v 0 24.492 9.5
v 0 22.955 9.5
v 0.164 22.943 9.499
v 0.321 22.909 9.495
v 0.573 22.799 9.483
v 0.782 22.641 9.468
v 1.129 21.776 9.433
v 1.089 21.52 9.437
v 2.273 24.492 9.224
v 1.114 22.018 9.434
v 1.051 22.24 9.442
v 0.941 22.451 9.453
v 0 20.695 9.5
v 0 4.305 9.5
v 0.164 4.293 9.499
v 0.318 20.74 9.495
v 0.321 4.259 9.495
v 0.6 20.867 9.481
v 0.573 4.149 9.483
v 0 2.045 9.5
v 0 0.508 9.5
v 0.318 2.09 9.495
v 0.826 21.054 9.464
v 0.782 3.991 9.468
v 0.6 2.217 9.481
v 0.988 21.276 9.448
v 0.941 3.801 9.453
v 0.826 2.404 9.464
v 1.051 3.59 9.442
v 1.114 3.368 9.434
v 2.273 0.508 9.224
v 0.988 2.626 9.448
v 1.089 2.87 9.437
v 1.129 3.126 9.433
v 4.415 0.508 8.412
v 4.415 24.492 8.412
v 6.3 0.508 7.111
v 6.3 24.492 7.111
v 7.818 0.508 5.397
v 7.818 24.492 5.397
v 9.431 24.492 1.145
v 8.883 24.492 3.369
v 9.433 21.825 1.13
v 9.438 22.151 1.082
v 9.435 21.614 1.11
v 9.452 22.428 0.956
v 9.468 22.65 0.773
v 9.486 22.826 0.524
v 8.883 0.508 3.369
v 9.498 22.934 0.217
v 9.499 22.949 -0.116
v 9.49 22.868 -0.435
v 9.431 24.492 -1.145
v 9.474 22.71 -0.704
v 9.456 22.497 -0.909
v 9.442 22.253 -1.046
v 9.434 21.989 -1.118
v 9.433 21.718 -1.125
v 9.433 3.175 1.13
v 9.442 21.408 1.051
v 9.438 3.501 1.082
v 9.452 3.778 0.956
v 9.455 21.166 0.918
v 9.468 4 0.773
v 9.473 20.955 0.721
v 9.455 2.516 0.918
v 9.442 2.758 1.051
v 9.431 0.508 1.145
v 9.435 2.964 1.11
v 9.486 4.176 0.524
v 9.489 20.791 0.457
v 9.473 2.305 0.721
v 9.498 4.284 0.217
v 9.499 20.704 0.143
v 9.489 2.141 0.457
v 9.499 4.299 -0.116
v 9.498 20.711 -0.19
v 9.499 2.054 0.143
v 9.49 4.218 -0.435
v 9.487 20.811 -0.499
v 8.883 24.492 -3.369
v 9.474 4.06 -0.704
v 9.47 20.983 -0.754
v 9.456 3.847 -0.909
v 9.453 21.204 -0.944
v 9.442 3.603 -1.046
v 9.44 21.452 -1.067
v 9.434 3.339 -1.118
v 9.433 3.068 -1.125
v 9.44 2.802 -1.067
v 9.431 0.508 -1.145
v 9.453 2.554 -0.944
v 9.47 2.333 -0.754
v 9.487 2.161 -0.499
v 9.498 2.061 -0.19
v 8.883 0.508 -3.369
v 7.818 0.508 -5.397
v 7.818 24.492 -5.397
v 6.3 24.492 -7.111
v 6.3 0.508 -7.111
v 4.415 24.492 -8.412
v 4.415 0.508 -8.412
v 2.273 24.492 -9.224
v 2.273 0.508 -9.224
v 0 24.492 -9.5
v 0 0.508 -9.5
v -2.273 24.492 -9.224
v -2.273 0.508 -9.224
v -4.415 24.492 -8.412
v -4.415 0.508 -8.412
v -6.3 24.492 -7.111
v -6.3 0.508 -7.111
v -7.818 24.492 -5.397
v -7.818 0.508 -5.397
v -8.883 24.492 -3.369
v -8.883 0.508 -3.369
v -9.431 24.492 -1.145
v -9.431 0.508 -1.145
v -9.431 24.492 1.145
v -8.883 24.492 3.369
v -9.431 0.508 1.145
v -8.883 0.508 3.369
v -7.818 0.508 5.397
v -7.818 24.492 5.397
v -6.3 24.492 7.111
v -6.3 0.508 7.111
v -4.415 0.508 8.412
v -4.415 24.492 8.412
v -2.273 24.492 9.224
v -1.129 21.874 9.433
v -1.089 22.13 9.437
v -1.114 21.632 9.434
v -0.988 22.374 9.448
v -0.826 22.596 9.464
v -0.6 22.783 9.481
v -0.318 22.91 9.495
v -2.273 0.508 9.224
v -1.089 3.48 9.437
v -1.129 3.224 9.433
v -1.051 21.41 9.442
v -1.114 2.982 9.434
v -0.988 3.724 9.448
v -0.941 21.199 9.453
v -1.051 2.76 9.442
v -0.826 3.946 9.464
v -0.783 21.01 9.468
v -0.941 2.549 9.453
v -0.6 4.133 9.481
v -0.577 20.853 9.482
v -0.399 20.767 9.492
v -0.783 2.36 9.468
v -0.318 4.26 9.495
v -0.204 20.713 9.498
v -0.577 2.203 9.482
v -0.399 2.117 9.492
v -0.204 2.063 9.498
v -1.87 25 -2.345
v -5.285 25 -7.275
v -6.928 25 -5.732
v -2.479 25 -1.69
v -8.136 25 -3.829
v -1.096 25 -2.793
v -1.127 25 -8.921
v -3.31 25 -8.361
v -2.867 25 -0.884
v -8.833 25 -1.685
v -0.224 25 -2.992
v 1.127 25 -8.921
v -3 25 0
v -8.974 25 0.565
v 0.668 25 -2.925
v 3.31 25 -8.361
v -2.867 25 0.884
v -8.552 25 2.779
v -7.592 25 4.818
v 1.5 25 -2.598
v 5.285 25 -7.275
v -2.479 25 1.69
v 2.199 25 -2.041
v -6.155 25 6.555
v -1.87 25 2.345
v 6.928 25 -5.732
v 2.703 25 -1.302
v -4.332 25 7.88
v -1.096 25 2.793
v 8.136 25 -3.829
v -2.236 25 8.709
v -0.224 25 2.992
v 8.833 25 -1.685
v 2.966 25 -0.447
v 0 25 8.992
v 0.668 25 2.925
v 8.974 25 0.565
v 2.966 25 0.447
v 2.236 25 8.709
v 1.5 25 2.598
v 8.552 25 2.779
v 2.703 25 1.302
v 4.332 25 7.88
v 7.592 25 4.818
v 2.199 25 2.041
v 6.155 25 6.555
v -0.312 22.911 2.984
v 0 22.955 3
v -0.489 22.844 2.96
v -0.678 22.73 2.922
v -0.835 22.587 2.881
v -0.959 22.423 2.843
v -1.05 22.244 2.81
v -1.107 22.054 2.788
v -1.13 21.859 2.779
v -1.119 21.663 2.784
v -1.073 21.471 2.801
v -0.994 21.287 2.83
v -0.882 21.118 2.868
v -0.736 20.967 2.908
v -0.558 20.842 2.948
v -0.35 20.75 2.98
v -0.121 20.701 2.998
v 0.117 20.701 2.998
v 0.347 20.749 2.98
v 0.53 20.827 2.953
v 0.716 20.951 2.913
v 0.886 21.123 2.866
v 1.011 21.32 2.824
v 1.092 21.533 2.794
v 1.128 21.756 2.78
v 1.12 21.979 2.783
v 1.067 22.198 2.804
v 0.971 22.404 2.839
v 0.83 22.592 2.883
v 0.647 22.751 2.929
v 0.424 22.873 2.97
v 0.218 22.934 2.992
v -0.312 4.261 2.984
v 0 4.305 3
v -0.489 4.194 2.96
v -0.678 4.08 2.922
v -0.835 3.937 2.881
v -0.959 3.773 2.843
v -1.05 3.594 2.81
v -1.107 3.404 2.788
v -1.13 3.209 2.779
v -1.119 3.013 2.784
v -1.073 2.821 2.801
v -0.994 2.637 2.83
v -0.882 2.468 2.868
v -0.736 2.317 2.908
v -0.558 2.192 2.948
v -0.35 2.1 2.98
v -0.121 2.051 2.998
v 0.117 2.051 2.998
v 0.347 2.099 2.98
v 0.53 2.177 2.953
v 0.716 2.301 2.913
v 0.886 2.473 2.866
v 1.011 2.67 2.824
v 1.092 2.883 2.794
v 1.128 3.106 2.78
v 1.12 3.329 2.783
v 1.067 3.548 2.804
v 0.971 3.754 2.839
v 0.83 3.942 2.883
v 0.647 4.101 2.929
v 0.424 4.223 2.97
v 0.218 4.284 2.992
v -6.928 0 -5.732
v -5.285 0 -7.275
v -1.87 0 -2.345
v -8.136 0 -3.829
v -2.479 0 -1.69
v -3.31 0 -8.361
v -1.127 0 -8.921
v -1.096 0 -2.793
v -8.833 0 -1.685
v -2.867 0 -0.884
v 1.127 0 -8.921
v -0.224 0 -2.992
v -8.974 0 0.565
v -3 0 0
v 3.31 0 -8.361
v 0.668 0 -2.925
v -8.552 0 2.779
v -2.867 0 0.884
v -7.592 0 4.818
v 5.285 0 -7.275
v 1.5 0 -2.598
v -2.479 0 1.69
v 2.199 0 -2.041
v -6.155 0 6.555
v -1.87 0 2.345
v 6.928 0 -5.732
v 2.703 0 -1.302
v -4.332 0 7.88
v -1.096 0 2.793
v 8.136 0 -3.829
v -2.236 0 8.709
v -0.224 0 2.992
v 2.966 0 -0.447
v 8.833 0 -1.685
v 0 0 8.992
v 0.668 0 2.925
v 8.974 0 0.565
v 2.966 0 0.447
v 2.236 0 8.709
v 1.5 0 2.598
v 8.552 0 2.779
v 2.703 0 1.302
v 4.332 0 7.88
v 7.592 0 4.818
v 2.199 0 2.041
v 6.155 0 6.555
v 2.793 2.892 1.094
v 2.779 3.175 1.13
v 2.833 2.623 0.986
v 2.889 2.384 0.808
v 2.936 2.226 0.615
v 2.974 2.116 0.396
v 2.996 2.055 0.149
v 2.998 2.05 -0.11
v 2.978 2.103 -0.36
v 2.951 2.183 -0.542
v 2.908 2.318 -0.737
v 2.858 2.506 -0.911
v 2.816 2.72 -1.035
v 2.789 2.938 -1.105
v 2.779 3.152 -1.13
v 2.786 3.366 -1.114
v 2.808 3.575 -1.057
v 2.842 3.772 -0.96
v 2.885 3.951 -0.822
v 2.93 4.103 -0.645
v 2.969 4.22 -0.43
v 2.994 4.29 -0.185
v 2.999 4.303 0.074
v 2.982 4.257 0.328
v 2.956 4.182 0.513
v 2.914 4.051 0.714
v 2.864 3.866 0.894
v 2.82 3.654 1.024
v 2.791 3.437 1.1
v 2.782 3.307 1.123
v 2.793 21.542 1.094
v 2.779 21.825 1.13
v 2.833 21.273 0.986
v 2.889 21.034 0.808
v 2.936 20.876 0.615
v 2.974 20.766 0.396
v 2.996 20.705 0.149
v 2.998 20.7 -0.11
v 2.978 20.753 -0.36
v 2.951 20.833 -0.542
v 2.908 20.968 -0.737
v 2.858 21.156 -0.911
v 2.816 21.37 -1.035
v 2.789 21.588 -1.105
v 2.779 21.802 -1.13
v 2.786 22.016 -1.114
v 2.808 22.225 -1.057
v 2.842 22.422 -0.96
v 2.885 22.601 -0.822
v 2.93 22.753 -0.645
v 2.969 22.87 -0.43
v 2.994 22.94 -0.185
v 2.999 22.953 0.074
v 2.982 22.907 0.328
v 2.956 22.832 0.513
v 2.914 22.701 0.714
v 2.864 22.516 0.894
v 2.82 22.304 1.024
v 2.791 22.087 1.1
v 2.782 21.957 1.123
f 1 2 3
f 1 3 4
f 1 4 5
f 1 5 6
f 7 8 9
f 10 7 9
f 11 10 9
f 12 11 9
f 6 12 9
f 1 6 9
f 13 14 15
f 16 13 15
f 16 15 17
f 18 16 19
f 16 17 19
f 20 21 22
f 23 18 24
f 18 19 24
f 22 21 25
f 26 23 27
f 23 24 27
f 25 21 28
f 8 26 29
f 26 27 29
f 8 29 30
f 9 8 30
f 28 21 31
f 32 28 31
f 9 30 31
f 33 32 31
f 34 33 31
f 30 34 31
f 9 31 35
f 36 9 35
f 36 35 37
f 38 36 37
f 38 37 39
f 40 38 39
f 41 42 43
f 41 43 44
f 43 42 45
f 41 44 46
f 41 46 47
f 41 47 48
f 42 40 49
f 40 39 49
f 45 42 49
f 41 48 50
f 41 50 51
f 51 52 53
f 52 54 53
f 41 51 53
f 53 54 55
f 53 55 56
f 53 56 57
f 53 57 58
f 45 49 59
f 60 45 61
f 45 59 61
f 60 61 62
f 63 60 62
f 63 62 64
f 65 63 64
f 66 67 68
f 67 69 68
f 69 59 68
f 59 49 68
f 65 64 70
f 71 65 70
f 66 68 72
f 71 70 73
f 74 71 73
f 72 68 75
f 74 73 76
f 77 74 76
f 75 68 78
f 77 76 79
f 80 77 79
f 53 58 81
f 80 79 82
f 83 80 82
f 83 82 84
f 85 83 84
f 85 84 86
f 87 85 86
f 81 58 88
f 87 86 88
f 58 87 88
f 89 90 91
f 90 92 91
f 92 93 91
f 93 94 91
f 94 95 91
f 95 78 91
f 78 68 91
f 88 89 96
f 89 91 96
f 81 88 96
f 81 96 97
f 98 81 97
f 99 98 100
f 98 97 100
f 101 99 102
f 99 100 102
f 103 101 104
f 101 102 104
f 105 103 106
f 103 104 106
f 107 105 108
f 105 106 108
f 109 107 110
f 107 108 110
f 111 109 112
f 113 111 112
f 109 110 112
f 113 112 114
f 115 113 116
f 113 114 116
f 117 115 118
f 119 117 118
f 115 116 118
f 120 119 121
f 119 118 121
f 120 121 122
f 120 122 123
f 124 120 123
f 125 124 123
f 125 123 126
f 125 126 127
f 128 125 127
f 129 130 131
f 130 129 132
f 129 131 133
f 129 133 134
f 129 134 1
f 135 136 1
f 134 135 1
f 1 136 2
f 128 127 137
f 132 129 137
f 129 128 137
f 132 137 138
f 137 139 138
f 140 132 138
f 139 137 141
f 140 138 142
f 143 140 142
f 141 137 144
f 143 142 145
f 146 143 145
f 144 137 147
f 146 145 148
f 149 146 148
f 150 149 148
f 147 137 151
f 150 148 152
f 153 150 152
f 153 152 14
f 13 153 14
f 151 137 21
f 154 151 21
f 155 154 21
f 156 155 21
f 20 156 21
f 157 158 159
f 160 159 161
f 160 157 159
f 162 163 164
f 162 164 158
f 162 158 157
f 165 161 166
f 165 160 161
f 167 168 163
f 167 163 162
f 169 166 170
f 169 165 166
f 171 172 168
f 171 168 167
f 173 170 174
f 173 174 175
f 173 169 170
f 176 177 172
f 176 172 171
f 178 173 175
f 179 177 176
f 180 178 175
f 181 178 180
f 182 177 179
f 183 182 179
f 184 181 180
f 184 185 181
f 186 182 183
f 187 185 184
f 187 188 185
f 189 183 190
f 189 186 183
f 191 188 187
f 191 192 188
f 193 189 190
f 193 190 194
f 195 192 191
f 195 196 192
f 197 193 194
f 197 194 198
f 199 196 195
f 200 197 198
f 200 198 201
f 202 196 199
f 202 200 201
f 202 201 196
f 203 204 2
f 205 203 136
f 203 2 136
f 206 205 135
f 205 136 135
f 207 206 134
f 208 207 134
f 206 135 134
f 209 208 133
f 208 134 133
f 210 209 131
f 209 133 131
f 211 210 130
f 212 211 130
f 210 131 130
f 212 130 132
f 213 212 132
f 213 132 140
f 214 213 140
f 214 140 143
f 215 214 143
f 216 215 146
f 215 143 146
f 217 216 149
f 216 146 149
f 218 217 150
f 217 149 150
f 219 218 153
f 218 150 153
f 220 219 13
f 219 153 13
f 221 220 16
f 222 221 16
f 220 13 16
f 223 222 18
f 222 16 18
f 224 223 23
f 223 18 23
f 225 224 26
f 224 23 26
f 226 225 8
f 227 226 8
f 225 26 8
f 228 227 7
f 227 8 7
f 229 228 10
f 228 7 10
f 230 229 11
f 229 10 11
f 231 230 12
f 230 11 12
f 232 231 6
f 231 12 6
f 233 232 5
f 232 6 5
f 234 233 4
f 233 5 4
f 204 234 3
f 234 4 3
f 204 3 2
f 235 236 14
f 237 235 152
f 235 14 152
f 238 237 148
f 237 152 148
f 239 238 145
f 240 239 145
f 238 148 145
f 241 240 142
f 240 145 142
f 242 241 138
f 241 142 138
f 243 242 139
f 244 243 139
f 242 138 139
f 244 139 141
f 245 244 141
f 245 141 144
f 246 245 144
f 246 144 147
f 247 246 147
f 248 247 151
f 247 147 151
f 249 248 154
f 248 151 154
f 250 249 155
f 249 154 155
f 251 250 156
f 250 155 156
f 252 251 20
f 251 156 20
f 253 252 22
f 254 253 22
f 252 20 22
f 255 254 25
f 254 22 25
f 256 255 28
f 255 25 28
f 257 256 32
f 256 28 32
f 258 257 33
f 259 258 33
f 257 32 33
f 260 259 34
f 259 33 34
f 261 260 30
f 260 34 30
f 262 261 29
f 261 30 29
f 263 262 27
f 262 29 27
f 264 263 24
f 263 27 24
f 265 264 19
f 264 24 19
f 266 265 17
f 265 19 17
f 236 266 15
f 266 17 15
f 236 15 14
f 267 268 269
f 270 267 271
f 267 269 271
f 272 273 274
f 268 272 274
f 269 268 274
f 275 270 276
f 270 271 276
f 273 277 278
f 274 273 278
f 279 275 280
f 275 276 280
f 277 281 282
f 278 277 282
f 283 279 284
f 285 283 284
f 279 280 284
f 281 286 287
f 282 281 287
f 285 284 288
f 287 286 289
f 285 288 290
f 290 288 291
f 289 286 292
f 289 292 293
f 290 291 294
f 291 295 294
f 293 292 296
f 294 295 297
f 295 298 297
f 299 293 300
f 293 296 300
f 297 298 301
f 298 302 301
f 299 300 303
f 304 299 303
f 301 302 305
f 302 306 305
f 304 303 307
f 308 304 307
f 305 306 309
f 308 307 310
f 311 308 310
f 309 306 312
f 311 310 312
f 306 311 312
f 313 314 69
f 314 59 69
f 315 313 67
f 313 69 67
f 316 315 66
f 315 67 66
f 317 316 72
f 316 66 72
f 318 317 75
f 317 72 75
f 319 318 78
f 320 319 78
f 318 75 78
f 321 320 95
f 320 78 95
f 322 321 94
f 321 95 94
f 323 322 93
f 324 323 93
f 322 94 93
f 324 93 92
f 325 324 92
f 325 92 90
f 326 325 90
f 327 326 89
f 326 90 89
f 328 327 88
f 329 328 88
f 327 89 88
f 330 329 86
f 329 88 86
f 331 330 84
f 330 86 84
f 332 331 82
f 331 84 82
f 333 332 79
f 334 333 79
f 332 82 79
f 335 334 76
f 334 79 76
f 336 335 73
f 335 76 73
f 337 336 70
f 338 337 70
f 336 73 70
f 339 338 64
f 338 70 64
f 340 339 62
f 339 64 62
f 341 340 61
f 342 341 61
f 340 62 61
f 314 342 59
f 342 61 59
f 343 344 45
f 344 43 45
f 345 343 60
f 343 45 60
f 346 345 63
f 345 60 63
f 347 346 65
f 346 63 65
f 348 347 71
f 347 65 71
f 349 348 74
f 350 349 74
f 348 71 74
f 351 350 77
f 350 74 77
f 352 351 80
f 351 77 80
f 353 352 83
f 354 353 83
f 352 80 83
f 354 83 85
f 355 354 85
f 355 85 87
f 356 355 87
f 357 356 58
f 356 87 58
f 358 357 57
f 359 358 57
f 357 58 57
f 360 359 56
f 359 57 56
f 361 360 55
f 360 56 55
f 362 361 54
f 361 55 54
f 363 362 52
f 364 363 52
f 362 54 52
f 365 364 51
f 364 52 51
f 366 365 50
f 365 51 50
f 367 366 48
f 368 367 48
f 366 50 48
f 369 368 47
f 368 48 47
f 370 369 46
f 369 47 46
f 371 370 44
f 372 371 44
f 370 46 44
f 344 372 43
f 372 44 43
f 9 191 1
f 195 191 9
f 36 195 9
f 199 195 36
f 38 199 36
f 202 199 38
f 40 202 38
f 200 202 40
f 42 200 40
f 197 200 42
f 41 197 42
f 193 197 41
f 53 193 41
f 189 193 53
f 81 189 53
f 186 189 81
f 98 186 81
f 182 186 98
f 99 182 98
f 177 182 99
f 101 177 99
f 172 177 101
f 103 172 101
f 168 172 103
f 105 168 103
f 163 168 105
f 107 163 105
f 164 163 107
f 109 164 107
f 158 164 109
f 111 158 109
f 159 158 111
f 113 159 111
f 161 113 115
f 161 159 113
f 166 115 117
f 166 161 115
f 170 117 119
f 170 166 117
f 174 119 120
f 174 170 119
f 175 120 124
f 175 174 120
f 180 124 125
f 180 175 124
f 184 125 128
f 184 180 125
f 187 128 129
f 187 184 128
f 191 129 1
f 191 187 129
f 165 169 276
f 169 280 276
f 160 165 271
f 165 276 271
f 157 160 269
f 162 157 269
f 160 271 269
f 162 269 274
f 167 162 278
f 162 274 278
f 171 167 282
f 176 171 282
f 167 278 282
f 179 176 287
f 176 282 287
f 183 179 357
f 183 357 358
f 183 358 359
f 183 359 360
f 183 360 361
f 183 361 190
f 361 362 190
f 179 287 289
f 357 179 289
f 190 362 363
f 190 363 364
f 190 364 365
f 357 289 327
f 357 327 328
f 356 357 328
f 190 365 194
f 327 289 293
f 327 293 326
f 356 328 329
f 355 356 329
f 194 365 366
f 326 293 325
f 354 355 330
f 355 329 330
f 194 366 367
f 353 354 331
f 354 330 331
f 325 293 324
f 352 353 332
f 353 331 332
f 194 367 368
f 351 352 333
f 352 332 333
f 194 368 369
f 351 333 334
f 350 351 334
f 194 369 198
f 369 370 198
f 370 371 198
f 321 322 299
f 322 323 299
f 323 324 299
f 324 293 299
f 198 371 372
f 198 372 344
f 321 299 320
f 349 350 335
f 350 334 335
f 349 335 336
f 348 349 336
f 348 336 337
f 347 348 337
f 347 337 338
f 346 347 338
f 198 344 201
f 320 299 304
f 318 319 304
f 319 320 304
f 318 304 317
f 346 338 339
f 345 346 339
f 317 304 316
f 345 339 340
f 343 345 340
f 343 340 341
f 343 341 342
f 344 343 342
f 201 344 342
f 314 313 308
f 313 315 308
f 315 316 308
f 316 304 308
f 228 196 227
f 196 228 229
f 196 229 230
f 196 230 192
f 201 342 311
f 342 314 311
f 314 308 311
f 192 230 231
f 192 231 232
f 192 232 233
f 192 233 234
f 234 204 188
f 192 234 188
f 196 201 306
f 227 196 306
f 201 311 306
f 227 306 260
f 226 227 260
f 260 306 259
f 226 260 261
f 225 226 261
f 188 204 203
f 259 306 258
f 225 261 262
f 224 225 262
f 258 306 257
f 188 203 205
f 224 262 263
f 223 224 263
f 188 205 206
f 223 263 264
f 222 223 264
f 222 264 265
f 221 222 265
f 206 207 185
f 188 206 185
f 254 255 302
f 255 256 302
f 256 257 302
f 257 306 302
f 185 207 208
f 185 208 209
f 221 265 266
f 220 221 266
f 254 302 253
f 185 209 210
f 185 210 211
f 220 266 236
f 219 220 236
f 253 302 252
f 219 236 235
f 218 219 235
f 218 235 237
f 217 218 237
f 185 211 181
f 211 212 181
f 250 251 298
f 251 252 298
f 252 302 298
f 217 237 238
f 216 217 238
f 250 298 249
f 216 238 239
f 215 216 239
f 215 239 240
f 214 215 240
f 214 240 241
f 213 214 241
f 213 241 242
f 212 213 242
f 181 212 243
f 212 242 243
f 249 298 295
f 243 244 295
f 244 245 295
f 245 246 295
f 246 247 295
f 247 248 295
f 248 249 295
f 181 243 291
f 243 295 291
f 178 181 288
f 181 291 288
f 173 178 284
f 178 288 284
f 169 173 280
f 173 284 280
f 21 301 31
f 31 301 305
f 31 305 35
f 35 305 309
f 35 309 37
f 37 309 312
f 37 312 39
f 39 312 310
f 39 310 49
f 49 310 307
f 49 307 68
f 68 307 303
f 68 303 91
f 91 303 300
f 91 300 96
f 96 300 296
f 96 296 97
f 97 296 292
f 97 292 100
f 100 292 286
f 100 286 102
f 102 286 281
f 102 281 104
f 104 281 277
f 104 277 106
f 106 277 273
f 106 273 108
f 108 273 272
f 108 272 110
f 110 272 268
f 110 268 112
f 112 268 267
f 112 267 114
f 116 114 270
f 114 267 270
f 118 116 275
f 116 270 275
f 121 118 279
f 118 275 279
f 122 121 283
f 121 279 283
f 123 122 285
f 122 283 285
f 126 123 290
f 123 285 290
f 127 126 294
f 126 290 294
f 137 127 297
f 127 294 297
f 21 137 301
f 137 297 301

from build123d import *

# Parameters (mm, degrees)
SKETCH1_R                      = 9.5
BOSS_EXTRUDE1_DEPTH            = 25
CHAMFER1_SIZE                  = 0.508
F_6_0MM_DOWEL_HOLE1_D          = 6
SKETCH7_W                      = 1.1303
SKETCH7_H                      = 9.5
F_4_40_TAPPED_HOLE1_AT_2_COUNT = 2
F_4_40_TAPPED_HOLE1_AT_2_PITCH = 18.65
SKETCH10_W                     = 1.1303
SKETCH10_H                     = 9.5
F_4_40_TAPPED_HOLE2_AT_2_COUNT = 2
F_4_40_TAPPED_HOLE2_AT_2_PITCH = 18.65


with BuildPart() as part:
    # Sketch1 → Boss-Extrude1 (new body)
    with BuildSketch(Plane(origin=(0, 0, 0), x_dir=(1, 0, 0), z_dir=(0, 1, 0))):
        with Locations(Location((0, 0, 0), (0, 0, 270))):
            Circle(SKETCH1_R)
    extrude(amount=BOSS_EXTRUDE1_DEPTH)

    # Chamfer1
    chamfer1_edges = [part.edges().sort_by_distance(p)[0] for p in [
        (0, 0, -9.5),
        (0, 25, -9.5),
    ]]
    chamfer(chamfer1_edges, length=CHAMFER1_SIZE)

    # Ø6.0mm Dowel Hole1 (through all)
    with Locations(Plane(origin=(0, 25, 0), x_dir=(1, 0, 0), z_dir=(0, 1, 0))):
        with Locations((0, 0)):
            Hole(F_6_0MM_DOWEL_HOLE1_D / 2)

    # Sketch7 → #4-40 Tapped Hole1 (revolve, cut)
    with BuildSketch(Plane.ZX.offset(21.825)):
        with Locations((0.56515, 4.75)):
            Rectangle(SKETCH7_W, SKETCH7_H)
    f_4_40_tapped_hole1 = revolve(axis=Axis((-6.35, 21.825, 0), (1, 0, 0)), mode=Mode.SUBTRACT)

    # #4-40 Tapped Hole1 at 2: #4-40 Tapped Hole1 ×2
    with Locations(*[(0, -i * F_4_40_TAPPED_HOLE1_AT_2_PITCH, 0) for i in range(1, F_4_40_TAPPED_HOLE1_AT_2_COUNT)]):
        add(f_4_40_tapped_hole1, mode=Mode.SUBTRACT)

    # Sketch10 → #4-40 Tapped Hole2 (revolve, cut)
    with BuildSketch(Plane(origin=(0, 21.825, 0), x_dir=(0, 1, 0), z_dir=(1, 0, 0))):
        with Locations((0.56515, 4.75)):
            Rectangle(SKETCH10_W, SKETCH10_H)
    f_4_40_tapped_hole2 = revolve(axis=Axis((0, 21.825, -6.35), (0, 0, 1)), mode=Mode.SUBTRACT)

    # #4-40 Tapped Hole2 at 2: #4-40 Tapped Hole2 ×2
    with Locations(*[(0, -i * F_4_40_TAPPED_HOLE2_AT_2_PITCH, 0) for i in range(1, F_4_40_TAPPED_HOLE2_AT_2_COUNT)]):
        add(f_4_40_tapped_hole2, mode=Mode.SUBTRACT)


solid = part.part
